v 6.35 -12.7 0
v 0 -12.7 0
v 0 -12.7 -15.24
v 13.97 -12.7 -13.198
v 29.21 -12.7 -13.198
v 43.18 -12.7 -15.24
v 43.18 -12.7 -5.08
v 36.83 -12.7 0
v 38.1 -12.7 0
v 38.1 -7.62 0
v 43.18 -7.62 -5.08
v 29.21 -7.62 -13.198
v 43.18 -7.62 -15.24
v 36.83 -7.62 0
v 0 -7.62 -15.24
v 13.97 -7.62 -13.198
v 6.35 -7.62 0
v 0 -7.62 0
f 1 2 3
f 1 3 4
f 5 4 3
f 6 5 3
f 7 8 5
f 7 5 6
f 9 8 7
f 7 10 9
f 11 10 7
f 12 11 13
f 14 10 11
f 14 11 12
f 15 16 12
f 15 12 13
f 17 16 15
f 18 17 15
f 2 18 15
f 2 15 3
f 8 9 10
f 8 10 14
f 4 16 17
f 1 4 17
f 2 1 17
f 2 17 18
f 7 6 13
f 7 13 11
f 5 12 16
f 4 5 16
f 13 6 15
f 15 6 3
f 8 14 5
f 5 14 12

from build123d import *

# Parameters (mm, degrees)
F1_DEPTH    = 116.84
F2_W        = 86.36
F2_H        = 15.24
F3_DEPTH    = 2.54
F4_W        = 86.36
F4_H        = 15.24
F5_DEPTH    = 2.54
F6_T1_DEPTH = 148.0482991577
F6_T3_DEPTH = 112.4882991577
F7_SIZE     = 5.08
F8_W        = 91.7793288827
F8_H        = 30.2478149533
F9_DEPTH    = 106.68
F10_W       = 99.2863364518
F10_H       = 25.3497036174
F11_DEPTH   = 10.16
F12_W       = 15.3326203581
F12_H       = 21.305212751
F13_DEPTH   = 43.18


# Not quite as in the source:
# - a fillet or chamfer that OpenCascade refuses, or shapes differently, is made with other operations: its cross-section is extruded or revolved along the edge and cut away or added


with BuildPart() as f1:
    # F0 (on Front) → F1 (new body)
    with BuildSketch(Plane.XZ):
        Polygon((43.18, 0), (36.83, 0), (29.21, -13.1982271537), (13.97, -13.1982271537), (6.35, 0), (0, 0), (-6.35, 0), (-13.97, -13.1982271537), (-29.21, -13.1982271537), (-36.83, 0), (-43.18, 0), (-43.18, -15.24), (0, -15.24), (43.18, -15.24), align=None)
    extrude(amount=F1_DEPTH)

    # F2 (on face) → F3 (join)
    with BuildSketch(Plane.XZ.offset(116.84)):
        with Locations((0, -7.62)):
            Rectangle(F2_W, F2_H)
    extrude(amount=F3_DEPTH)

    # F4 (on face) → F5 (join)
    with BuildSketch(Plane(origin=(0, 0, 0), x_dir=(-1, 0, 0), z_dir=(0, 1, 0))):
        with Locations((0, -7.62)):
            Rectangle(F4_W, F4_H)
    extrude(amount=F5_DEPTH)

    # F6: chamfer of 5.08 on 4 edges, made by hand

    # F6_s2 → F6_t1 (cut)
    with BuildSketch(Plane.XZ.offset(-15.6041495789)):
        Polygon((-38.1, 0), (-43.18, -5.08), (-43.18, 0), align=None)
        Polygon((38.1, 0), (43.18, -5.08), (43.18, 0), align=None)
    extrude(amount=F6_T1_DEPTH, mode=Mode.SUBTRACT)

    # F6_s4 → F6_t3 (cut)
    with BuildSketch(Plane.YZ.offset(-56.2441495789)):
        Polygon((-114.3, 0), (-119.38, -5.08), (-119.38, 0), align=None)
        Polygon((-2.54, 0), (2.54, -5.08), (2.54, 0), align=None)
    extrude(amount=F6_T3_DEPTH, mode=Mode.SUBTRACT)

    # F7
    f7_edges = [f1.edges().sort_by_distance(p)[0] for p in [
        (-43.18, -119.38, -10.16),
        (43.18, -119.38, -10.16),
        (43.18, 2.54, -10.16),
        (-43.18, 2.54, -10.16),
    ]]
    chamfer(f7_edges, length=F7_SIZE)

    # F8 (on face) → F9 (cut)
    with BuildSketch(Plane.XZ.offset(119.38)):
        with Locations((-0.610165298, -4.9024894834)):
            Rectangle(F8_W, F8_H)
    extrude(amount=-F9_DEPTH, mode=Mode.SUBTRACT)

    # F10 (on face) → F11 (cut)
    with BuildSketch(Plane(origin=(0, 2.54, 0), x_dir=(-1, 0, 0), z_dir=(0, 1, 0))):
        with Locations((1.3202968985, -7.6577230357)):
            Rectangle(F10_W, F10_H)
    extrude(amount=-F11_DEPTH, mode=Mode.SUBTRACT)

    # F12 (on face) → F13 (cut)
    with BuildSketch(Plane(origin=(-43.18, 0, 0), x_dir=(0, -1, 0), z_dir=(-1, 0, 0))):
        with Locations((10.5058533372, -7.6547963545)):
            Rectangle(F12_W, F12_H)
    extrude(amount=-F13_DEPTH, mode=Mode.SUBTRACT)


solid = f1.part
